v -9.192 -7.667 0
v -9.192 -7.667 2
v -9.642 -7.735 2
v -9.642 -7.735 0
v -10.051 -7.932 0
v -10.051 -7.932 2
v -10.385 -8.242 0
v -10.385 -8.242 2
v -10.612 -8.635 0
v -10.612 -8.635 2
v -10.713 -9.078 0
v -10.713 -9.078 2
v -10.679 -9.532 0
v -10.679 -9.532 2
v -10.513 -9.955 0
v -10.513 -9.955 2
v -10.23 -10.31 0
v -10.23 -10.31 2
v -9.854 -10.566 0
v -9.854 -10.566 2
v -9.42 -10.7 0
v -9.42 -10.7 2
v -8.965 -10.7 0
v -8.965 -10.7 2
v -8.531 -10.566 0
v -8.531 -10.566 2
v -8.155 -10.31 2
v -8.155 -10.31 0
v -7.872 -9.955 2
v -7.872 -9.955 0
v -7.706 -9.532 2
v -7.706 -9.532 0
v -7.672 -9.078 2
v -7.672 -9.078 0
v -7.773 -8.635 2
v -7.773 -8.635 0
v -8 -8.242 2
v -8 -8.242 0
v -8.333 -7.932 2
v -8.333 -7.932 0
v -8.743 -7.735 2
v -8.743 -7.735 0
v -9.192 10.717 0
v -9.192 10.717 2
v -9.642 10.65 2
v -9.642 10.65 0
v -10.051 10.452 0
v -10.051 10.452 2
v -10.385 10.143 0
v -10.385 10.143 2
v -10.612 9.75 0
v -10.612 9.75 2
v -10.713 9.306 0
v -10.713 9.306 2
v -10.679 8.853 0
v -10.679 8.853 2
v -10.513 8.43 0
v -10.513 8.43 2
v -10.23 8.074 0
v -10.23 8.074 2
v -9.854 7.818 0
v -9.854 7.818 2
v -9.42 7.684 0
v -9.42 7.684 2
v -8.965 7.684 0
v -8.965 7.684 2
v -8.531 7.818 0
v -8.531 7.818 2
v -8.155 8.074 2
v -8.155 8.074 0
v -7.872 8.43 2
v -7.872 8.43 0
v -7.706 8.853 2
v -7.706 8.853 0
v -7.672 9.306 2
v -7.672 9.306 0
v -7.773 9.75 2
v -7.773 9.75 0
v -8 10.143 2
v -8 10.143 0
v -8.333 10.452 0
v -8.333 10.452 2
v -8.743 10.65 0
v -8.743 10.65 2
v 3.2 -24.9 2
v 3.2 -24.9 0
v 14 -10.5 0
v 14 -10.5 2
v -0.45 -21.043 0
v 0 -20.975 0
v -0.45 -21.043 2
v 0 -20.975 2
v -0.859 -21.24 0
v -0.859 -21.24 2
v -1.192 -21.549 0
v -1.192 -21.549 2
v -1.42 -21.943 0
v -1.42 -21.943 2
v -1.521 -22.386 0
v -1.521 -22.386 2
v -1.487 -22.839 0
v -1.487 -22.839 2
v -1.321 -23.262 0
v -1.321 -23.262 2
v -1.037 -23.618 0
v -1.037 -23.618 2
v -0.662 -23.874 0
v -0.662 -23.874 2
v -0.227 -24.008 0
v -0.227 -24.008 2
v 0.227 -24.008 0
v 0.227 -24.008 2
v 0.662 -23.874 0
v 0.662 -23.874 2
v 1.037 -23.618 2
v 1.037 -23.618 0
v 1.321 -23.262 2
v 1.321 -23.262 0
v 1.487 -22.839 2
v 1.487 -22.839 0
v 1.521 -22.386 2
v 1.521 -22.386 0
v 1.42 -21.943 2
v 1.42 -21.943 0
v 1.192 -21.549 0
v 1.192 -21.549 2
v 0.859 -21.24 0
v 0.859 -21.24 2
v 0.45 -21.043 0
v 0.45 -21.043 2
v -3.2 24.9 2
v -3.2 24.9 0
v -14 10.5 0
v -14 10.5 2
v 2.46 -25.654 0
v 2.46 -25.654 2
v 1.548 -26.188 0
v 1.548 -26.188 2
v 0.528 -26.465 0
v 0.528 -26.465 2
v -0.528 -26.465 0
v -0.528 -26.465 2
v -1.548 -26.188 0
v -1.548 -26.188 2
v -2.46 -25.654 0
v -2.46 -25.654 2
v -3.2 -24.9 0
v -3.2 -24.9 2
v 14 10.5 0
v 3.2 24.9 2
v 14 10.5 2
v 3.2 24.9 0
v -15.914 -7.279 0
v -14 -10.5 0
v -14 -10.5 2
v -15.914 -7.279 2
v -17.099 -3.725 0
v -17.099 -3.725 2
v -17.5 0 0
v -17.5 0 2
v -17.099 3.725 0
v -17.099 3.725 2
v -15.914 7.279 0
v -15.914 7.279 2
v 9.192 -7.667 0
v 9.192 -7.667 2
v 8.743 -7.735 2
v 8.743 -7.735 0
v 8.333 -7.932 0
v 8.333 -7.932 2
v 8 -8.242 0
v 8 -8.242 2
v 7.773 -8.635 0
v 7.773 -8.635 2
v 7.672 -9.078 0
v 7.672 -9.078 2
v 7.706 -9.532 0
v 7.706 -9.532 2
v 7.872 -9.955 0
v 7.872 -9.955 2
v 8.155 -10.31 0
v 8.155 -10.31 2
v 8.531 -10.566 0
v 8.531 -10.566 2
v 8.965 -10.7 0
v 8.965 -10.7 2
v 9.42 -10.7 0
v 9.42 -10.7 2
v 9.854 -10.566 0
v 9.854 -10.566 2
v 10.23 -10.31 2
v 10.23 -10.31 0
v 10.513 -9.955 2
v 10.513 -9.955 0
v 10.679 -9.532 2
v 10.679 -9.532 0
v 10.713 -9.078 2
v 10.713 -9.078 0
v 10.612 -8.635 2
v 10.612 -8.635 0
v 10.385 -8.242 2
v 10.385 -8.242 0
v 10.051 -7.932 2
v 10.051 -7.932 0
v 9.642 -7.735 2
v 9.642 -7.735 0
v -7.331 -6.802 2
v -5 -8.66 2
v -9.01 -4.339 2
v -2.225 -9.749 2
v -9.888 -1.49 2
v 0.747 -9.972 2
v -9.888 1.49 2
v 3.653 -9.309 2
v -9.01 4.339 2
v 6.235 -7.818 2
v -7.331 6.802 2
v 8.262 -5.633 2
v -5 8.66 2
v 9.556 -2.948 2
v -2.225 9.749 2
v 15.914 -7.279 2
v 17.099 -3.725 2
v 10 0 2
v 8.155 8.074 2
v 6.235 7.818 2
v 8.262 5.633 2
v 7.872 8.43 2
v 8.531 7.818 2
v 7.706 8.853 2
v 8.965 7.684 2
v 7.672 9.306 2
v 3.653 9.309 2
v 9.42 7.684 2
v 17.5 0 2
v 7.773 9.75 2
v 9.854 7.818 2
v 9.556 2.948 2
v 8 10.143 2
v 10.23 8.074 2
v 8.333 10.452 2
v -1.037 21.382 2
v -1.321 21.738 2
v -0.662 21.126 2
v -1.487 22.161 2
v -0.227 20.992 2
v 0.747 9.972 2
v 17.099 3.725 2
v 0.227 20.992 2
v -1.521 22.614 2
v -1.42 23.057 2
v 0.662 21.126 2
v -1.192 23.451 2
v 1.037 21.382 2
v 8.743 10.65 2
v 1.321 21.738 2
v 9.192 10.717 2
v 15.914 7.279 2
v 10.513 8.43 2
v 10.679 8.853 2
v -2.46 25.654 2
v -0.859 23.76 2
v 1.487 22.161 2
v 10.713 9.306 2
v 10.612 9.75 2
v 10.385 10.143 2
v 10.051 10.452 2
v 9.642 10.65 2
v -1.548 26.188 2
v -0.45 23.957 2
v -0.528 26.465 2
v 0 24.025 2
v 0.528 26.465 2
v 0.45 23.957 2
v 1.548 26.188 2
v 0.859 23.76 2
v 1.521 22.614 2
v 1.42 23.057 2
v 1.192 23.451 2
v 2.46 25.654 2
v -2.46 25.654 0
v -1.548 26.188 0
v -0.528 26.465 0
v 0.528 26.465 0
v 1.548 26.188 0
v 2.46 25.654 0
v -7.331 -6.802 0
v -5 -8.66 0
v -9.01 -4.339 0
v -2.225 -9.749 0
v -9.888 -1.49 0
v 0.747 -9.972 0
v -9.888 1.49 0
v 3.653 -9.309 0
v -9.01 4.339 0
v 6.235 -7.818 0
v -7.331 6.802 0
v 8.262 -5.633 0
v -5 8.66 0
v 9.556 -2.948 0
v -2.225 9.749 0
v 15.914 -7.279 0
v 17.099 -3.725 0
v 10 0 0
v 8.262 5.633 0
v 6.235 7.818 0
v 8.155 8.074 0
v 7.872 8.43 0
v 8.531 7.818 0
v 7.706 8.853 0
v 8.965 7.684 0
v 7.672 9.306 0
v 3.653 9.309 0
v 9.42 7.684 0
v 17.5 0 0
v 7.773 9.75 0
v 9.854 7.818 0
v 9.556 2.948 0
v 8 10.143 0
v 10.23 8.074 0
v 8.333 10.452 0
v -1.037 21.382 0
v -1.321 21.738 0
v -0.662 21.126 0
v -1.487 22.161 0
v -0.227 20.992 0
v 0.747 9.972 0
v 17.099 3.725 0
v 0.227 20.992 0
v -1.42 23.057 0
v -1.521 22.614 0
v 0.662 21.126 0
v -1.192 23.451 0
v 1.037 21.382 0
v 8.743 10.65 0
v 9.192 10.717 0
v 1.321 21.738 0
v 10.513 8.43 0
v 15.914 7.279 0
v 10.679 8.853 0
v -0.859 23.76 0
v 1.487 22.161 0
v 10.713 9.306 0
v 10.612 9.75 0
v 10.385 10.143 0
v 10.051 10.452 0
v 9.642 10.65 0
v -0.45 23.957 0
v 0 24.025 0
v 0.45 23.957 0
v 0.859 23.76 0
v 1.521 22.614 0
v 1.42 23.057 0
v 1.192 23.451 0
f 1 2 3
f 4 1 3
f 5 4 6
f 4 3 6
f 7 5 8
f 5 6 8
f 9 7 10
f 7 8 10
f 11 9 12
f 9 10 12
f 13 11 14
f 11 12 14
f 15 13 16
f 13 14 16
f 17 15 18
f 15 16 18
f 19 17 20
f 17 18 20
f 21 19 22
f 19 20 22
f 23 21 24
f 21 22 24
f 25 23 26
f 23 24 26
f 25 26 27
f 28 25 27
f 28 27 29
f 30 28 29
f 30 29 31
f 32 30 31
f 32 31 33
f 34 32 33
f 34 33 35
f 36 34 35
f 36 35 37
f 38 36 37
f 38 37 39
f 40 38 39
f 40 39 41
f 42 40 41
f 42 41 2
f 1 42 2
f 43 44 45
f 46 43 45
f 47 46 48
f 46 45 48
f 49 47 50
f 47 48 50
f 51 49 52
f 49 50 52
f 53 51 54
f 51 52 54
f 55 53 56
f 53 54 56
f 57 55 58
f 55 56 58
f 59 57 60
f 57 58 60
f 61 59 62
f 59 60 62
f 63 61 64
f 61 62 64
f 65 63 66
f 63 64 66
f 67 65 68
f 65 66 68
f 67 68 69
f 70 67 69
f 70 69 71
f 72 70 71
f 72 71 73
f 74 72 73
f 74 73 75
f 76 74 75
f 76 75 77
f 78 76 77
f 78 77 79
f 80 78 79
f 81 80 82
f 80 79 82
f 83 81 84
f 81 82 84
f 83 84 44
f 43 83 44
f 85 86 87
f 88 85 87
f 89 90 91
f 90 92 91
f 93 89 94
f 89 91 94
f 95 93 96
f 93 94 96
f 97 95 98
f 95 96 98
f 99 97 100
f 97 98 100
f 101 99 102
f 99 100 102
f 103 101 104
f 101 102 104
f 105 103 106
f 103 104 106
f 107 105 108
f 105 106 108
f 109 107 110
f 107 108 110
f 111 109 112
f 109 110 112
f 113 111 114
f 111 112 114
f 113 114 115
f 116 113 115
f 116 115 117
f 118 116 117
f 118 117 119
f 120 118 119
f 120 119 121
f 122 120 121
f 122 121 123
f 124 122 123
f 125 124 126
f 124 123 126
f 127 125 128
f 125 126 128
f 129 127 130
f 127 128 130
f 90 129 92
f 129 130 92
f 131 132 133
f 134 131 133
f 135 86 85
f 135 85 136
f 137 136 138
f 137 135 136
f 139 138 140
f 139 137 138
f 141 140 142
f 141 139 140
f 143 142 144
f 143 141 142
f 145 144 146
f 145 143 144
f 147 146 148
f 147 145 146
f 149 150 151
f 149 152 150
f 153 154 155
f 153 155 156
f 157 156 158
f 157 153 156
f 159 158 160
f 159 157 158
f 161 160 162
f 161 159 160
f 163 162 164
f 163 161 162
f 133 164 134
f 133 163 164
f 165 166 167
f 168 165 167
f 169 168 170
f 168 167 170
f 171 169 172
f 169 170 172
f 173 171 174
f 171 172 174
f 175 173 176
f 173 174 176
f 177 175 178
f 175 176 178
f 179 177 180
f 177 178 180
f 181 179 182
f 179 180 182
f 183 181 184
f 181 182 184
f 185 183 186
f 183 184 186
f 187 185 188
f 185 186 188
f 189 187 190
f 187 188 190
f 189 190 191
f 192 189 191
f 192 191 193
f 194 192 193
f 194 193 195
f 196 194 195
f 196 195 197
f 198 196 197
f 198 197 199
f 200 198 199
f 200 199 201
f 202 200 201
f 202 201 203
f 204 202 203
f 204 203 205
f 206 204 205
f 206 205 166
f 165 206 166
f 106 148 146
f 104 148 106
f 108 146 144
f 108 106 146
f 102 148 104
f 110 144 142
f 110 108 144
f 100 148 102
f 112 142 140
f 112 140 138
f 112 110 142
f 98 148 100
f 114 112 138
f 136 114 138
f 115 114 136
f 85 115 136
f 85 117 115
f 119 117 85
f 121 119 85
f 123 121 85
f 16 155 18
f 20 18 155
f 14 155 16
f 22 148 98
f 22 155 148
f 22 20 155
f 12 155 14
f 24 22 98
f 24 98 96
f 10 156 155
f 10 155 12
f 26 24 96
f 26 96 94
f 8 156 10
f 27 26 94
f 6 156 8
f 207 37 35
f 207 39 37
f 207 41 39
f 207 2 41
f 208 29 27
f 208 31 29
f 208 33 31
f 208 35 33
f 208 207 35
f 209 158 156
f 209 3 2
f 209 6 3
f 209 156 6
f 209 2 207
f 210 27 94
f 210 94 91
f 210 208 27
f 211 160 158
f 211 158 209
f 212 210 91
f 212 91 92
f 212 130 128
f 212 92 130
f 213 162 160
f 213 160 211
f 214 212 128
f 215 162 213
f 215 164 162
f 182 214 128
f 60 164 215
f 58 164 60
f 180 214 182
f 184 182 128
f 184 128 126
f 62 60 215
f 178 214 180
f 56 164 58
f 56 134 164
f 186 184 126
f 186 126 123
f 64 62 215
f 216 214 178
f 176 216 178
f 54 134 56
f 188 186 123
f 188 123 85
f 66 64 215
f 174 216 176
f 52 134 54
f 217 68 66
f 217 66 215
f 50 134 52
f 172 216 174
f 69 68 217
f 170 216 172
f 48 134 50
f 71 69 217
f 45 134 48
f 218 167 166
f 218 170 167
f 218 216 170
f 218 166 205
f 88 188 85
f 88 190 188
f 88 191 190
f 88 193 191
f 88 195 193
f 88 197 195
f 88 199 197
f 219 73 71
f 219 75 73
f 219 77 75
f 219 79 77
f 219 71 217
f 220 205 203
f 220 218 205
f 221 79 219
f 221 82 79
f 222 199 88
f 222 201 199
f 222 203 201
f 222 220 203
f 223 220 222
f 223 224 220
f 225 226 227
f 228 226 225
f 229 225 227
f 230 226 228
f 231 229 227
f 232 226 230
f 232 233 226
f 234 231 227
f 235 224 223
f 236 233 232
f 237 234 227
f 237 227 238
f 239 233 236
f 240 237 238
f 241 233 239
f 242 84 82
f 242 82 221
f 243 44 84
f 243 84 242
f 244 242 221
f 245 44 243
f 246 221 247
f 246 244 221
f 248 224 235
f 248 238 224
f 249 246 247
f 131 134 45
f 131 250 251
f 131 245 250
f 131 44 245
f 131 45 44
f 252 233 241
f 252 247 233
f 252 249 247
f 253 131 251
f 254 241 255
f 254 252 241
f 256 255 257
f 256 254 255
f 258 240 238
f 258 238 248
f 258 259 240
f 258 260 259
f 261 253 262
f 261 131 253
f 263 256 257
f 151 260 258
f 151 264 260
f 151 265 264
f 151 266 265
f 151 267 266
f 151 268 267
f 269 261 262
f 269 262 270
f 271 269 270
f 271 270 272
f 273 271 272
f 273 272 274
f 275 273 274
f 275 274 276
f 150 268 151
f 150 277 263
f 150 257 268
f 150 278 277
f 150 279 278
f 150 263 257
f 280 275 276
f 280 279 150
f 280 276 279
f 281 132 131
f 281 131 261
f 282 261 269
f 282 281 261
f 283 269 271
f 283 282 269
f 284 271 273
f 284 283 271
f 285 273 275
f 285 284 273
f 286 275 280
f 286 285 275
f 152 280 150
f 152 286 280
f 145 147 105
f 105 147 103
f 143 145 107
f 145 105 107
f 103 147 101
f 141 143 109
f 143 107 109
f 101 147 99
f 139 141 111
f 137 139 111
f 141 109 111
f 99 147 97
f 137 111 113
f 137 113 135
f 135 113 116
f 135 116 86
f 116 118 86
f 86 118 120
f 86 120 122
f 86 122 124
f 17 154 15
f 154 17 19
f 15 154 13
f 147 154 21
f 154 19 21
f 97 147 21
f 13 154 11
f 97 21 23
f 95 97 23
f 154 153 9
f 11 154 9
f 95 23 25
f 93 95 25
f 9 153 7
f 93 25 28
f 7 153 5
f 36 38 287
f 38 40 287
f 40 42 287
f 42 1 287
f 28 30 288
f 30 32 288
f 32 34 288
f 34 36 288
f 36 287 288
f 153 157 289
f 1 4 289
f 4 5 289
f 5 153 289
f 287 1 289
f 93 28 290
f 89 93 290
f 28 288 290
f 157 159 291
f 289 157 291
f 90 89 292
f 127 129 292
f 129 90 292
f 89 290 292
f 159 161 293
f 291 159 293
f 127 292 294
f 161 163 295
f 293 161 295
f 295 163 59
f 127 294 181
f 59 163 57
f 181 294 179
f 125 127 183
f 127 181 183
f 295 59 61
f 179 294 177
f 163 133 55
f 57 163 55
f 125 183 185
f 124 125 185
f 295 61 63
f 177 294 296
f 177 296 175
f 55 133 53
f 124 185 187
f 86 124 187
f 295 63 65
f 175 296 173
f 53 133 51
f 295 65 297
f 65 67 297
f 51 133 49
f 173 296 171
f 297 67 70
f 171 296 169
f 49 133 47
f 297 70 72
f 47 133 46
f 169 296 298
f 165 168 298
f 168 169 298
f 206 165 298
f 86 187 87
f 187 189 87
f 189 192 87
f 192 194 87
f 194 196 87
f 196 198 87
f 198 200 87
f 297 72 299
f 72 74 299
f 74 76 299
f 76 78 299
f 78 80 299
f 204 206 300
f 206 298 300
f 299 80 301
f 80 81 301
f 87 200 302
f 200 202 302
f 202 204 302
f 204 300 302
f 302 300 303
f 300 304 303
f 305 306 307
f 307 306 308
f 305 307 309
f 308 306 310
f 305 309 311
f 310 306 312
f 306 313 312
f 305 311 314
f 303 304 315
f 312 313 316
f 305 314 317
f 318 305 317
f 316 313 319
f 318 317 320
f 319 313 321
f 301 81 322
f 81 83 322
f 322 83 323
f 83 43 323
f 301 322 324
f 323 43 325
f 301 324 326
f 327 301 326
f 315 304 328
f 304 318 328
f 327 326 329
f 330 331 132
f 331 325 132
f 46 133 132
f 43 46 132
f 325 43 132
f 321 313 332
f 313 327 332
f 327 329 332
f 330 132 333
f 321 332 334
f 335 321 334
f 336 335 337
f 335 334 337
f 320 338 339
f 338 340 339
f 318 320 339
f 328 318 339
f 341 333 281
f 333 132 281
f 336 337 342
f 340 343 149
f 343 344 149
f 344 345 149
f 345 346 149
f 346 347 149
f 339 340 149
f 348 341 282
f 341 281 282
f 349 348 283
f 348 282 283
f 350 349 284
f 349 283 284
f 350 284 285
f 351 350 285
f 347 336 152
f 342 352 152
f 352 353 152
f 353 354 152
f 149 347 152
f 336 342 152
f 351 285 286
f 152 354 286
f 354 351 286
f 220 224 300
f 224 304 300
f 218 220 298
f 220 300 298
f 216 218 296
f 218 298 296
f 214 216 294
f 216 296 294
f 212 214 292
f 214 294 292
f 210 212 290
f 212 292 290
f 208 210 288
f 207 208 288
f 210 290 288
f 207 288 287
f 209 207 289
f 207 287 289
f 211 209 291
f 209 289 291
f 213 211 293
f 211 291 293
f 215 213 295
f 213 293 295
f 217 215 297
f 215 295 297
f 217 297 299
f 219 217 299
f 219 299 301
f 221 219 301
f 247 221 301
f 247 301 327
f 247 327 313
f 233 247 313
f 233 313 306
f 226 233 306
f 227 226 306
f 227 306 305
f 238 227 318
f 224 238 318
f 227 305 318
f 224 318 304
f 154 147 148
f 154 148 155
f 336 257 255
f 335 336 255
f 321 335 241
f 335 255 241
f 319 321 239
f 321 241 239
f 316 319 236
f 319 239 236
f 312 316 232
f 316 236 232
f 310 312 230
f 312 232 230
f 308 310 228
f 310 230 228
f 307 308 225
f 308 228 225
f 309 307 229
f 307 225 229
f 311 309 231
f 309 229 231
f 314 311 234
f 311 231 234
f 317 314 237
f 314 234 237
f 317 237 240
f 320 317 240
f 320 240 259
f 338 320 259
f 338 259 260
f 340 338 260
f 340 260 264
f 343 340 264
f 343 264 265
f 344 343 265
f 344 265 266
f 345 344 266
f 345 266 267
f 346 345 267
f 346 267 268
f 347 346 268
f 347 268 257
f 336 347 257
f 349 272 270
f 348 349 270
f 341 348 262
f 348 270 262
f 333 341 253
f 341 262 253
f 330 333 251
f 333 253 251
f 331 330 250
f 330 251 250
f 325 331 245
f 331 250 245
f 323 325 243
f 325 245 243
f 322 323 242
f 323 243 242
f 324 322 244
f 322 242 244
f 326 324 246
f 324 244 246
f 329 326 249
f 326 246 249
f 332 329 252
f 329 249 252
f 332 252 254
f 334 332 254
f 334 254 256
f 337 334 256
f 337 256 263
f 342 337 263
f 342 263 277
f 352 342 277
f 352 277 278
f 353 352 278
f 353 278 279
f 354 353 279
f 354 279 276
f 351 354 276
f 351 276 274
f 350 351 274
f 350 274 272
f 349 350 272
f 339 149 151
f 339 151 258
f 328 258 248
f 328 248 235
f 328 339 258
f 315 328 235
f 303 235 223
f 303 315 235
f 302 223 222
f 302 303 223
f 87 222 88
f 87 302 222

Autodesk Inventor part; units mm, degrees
ref_plane "YZ Plane" through (0, 0, 0) normal (1, 0, 0) x (0, 1, 0)
ref_plane "XZ Plane" through (0, 0, 0) normal (0, 1, 0) x (-1, 0, 0)
ref_plane "XY Plane" through (0, 0, 0) normal (0, 0, 1) x (1, 0, 0)
sketch "スケッチ1" plane through (0, 0, 0) normal (0, 0, 1) x (1, 0, 0)
  circle A0 centre (0, 0) radius 10
  circle A1 centre (0, 0) radius 13 construction
  line L0 (0, 0) -> (0, -7.3396) construction
  circle A2 centre (9.1924, -9.1924) radius 1.55 construction
  line L1 (0, 0) -> (9.1924, -9.1924) construction
  circle A3 centre (9.1924, 9.1924) radius 1.55 construction
  circle A4 centre (-9.1924, 9.1924) radius 1.55 construction
  circle A5 centre (-9.1924, -9.1924) radius 1.55 construction
  line L2 (-24.5, 0) -> (24.5, 0) projected
  circle A6 centre (0, 22.5) radius 4
  circle A7 centre (0, -22.5) radius 4
  circle A8 centre (0, 0) radius 16 construction
  circle A9 centre (0, 0) radius 17.5
  line L3 (-3.2, 24.9) -> (-14, 10.5)
  line L4 (-3.2, -24.9) -> (-14, -10.5)
  line L5 (3.2, -24.9) -> (14, -10.5)
  line L6 (3.2, 24.9) -> (14, 10.5)
  dimension "d3" = 26
  dimension "d2" = 20
  dimension "d4" = 3.1
  dimension "d5" = 45
  dimension "d9" = 360
  dimension "d13" = 45
  dimension "d14" = 8
  dimension "d15" = 8
  dimension "d16" = 32
  dimension "d17" = 35
extrude "押し出し1" add sketch "スケッチ1" along normal blind 2 contours L2 A9 A0 | A0 L2 A9 | A9 L3 A6 L6 | L5 A7 L4 A9 | A6 | A7
hole "穴1" at (9.1924, -9.1924, 0) at (-9.1924, -9.1924, 0) at (9.1924, 9.1924, 0) at (-9.1924, 9.1924, 0) at (0, 22.5, 0) at (0, -22.5, 0) direction (0, 0, 1) diameter 3.05 end through all
properties part number "al_motorbase_1" material "アルミニウム 6061-AHC"
